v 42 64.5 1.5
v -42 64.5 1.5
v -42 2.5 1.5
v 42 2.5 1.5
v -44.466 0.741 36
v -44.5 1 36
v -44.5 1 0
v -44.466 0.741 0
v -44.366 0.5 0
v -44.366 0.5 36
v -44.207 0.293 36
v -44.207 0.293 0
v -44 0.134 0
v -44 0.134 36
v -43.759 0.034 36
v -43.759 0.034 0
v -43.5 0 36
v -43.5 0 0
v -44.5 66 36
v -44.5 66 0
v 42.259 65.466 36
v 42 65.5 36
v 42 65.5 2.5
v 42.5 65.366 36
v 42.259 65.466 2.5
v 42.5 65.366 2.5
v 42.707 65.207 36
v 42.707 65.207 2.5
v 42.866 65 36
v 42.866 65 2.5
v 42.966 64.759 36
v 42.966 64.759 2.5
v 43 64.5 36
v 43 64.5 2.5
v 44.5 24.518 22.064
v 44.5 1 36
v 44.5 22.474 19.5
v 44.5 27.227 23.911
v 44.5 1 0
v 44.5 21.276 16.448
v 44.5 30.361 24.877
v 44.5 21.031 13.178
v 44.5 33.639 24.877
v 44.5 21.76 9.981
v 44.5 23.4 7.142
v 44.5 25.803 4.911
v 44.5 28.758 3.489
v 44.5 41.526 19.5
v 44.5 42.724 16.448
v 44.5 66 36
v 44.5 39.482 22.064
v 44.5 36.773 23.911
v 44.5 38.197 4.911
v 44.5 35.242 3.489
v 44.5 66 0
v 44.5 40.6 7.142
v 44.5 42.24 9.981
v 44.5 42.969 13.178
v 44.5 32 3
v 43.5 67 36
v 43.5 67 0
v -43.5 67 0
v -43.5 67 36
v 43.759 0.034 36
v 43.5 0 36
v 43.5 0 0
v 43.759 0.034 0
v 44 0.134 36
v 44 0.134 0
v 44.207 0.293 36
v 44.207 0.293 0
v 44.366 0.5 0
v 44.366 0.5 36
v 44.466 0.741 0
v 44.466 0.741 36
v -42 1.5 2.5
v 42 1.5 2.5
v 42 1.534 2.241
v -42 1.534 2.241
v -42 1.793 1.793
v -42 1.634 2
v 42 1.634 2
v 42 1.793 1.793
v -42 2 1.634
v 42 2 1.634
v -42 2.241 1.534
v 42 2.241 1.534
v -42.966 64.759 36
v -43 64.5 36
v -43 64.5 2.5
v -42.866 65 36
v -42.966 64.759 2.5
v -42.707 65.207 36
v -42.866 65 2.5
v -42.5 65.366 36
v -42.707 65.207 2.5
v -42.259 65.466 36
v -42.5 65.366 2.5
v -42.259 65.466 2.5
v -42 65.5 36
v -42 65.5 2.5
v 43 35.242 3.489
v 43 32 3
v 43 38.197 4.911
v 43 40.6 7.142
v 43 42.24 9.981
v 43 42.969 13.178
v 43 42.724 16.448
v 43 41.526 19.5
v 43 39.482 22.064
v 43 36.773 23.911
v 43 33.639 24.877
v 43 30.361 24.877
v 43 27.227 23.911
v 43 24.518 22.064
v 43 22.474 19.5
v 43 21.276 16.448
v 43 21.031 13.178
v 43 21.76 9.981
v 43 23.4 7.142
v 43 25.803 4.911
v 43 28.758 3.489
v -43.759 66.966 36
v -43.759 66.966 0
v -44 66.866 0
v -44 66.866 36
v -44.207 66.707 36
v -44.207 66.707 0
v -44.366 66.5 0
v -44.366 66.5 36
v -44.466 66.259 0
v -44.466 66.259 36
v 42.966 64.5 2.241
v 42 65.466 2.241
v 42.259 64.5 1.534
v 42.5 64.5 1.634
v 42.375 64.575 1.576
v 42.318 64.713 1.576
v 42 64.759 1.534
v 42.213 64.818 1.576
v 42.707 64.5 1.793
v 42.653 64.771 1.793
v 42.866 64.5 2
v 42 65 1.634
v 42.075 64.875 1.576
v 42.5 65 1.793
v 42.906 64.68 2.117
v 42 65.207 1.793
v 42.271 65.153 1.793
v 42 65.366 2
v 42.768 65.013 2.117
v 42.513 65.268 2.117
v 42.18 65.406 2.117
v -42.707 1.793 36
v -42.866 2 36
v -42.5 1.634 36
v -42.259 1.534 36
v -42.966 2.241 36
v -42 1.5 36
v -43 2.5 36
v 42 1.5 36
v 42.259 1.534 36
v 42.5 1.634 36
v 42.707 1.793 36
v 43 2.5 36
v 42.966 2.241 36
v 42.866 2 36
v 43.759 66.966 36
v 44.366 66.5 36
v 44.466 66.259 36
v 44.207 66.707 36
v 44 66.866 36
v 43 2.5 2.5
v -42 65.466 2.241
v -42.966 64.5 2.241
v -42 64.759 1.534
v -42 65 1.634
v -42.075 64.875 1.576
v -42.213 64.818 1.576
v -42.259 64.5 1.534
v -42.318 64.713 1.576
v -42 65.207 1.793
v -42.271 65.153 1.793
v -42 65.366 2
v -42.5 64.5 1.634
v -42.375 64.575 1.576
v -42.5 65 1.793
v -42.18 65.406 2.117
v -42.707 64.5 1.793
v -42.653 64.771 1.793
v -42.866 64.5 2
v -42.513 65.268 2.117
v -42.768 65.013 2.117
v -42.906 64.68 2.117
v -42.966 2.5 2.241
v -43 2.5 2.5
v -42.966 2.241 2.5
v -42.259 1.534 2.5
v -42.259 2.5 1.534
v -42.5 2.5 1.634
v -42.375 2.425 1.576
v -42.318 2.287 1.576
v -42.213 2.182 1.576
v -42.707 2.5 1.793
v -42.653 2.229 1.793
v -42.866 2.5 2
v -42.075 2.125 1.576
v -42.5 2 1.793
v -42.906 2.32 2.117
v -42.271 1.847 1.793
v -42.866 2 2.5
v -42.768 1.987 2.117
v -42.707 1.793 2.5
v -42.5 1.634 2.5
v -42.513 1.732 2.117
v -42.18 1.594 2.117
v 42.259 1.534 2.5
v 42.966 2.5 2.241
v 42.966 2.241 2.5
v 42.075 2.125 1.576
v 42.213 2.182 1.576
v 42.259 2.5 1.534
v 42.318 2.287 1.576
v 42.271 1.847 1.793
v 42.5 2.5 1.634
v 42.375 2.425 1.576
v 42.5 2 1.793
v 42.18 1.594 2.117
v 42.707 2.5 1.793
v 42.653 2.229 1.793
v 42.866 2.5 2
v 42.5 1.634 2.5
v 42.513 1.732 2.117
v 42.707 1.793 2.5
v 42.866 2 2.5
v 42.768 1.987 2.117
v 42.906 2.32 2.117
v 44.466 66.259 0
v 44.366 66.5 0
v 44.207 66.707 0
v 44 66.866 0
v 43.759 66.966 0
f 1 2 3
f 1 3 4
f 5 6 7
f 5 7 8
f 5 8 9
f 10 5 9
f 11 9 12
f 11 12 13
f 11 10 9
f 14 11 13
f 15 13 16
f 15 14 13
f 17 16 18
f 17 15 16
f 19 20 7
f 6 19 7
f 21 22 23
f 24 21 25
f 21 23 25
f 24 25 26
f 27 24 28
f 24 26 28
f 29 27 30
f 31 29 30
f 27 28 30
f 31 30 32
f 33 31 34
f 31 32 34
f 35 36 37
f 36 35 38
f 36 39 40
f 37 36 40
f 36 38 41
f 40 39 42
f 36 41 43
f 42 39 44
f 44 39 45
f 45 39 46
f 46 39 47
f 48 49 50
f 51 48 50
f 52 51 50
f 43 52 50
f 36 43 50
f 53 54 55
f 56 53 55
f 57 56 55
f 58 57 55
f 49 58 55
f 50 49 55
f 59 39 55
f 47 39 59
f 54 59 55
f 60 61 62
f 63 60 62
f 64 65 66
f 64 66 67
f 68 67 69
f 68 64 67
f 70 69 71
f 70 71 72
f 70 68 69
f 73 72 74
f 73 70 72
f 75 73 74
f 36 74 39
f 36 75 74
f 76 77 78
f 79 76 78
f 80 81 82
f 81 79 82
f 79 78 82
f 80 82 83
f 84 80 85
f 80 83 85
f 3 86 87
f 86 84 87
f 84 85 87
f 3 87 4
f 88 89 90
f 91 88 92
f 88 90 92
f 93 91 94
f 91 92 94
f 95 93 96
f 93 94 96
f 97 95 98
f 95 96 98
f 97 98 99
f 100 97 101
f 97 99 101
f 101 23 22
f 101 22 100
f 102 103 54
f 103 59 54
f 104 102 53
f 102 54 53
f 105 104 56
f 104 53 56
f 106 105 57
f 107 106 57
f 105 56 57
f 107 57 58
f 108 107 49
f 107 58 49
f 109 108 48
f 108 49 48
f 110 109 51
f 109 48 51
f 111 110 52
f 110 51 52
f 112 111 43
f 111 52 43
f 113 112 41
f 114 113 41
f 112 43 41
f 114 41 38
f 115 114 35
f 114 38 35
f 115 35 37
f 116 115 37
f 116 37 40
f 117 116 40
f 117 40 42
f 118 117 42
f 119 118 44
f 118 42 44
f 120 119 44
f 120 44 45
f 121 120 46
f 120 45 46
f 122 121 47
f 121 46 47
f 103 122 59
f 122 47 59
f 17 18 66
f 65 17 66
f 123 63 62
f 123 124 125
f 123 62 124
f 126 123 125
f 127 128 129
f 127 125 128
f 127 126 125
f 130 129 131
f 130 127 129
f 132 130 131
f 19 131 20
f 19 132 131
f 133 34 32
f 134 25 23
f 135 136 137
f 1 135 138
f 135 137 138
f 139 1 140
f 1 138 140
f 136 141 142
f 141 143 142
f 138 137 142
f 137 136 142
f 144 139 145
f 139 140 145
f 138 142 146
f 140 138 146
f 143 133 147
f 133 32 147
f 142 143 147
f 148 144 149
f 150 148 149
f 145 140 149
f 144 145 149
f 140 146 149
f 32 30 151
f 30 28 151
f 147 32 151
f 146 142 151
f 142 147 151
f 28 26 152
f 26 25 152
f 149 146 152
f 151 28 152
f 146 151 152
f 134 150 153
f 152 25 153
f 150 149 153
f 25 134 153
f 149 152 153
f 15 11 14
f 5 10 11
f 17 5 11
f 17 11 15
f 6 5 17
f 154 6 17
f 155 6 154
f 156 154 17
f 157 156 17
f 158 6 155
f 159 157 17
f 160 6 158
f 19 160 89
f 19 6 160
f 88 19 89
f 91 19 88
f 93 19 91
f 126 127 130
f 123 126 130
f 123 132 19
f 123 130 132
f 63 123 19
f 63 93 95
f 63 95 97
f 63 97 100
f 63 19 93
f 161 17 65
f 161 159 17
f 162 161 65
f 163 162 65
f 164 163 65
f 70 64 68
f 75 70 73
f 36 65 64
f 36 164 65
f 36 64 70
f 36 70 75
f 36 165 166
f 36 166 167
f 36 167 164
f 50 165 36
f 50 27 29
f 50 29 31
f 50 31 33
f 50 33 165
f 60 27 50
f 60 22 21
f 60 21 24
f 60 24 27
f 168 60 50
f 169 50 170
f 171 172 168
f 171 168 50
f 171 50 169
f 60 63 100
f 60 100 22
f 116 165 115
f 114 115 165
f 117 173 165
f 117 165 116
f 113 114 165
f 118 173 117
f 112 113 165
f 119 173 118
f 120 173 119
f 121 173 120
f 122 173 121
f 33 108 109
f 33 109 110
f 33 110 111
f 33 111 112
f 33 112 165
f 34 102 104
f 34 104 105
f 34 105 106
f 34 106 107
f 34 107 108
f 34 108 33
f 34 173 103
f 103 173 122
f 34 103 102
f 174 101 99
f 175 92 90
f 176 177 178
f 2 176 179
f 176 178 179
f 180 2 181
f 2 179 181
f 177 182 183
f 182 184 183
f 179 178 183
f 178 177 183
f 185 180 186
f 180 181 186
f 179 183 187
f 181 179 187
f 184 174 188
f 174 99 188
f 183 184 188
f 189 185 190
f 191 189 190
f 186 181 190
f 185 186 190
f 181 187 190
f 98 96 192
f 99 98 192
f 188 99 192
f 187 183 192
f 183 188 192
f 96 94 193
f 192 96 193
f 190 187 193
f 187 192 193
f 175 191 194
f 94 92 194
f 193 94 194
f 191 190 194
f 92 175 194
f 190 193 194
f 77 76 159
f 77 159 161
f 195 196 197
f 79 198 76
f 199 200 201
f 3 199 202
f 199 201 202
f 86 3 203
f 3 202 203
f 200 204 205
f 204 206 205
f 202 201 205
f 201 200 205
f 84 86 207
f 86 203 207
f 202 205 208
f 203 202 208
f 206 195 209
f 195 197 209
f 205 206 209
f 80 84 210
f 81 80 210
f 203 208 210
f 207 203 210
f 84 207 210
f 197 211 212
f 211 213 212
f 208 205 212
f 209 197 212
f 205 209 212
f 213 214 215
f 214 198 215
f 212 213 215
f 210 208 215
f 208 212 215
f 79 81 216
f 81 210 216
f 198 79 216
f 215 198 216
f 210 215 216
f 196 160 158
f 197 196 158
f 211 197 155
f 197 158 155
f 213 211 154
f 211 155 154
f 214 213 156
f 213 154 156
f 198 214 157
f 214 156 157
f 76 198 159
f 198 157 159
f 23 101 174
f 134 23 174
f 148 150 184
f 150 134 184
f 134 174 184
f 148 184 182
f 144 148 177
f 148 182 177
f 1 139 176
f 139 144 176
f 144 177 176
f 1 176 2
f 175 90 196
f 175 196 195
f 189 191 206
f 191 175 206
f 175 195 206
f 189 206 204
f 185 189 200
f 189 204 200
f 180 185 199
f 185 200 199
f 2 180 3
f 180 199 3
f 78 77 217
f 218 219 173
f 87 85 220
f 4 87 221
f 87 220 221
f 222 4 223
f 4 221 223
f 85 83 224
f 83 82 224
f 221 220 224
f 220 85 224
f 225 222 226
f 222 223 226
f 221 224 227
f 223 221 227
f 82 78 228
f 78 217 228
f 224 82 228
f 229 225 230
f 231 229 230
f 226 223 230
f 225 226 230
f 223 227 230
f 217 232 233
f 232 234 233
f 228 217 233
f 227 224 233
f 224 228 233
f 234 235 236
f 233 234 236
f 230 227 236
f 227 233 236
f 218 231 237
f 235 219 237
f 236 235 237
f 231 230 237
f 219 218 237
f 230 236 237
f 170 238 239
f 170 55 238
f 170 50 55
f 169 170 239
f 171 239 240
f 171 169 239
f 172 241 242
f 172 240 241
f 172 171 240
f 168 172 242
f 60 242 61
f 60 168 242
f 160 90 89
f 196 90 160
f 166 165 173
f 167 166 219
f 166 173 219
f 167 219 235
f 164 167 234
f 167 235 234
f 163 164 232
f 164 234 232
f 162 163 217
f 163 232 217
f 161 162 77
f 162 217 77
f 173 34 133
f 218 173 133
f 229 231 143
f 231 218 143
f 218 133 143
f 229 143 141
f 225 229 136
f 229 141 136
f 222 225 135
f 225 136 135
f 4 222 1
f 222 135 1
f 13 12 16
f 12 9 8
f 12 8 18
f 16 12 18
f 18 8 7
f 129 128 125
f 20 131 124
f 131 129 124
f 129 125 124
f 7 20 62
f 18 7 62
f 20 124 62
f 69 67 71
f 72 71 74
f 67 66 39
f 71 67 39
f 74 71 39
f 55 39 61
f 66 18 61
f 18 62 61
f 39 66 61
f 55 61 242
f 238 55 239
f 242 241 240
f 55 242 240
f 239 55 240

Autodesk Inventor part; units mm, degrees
ref_plane "YZ Plane" through (0, 0, 0) normal (1, 0, 0) x (0, 1, 0)
ref_plane "XZ Plane" through (0, 0, 0) normal (0, 1, 0) x (-1, 0, 0)
ref_plane "XY Plane" through (0, 0, 0) normal (0, 0, 1) x (1, 0, 0)
sketch "Skizze2" plane through (0, 0, 0) normal (0, 0, 1) x (1, 0, 0)
  line L0 (-44.5, 0) -> (44.5, 0)
  line L1 (44.5, 0) -> (44.5, 67)
  line L2 (44.5, 67) -> (-44.5, 67)
  line L3 (-44.5, 67) -> (-44.5, 0)
  point P0 (0, 0)
  point P1 (0, 0)
  dimension "d0" = 89
  dimension "d1" = 67
extrude "Extrusion1" add sketch "Skizze2" along normal blind 36
shell "Wandung1" thickness 1.5 removed faces 1 at (-14.8333, 44.6667, 36)
sketch "Skizze3" plane through (44.5, 0, 0) normal (1, 0, 0) x (0, 0, -1)
  circle A0 centre (-14, 32) radius 11
  line L0 (0, 0) -> (0, 67) projected
  line L1 (0, 67) -> (-36, 67) projected
  dimension "d5" = 22
  dimension "d6" = 14
  dimension "d7" = 35
extrude "Extrusion2" cut sketch "Skizze3" against normal up to surface (1.5 mm away)
fillet "Rundung1" radius 1 12 edges at (44.5, 67, 18) (44.5, 0, 18) (-44.5, 0, 18) (-44.5, 67, 18) (-43, 65.5, 18.75) (43, 65.5, 18.75) (43, 1.5, 18.75) (-43, 1.5, 18.75) (-43, 33.5, 1.5) (0, 1.5, 1.5) (43, 33.5, 1.5) (0, 65.5, 1.5)
properties part number "102 part 1" material "Aluminum 6061, geschweißt"
